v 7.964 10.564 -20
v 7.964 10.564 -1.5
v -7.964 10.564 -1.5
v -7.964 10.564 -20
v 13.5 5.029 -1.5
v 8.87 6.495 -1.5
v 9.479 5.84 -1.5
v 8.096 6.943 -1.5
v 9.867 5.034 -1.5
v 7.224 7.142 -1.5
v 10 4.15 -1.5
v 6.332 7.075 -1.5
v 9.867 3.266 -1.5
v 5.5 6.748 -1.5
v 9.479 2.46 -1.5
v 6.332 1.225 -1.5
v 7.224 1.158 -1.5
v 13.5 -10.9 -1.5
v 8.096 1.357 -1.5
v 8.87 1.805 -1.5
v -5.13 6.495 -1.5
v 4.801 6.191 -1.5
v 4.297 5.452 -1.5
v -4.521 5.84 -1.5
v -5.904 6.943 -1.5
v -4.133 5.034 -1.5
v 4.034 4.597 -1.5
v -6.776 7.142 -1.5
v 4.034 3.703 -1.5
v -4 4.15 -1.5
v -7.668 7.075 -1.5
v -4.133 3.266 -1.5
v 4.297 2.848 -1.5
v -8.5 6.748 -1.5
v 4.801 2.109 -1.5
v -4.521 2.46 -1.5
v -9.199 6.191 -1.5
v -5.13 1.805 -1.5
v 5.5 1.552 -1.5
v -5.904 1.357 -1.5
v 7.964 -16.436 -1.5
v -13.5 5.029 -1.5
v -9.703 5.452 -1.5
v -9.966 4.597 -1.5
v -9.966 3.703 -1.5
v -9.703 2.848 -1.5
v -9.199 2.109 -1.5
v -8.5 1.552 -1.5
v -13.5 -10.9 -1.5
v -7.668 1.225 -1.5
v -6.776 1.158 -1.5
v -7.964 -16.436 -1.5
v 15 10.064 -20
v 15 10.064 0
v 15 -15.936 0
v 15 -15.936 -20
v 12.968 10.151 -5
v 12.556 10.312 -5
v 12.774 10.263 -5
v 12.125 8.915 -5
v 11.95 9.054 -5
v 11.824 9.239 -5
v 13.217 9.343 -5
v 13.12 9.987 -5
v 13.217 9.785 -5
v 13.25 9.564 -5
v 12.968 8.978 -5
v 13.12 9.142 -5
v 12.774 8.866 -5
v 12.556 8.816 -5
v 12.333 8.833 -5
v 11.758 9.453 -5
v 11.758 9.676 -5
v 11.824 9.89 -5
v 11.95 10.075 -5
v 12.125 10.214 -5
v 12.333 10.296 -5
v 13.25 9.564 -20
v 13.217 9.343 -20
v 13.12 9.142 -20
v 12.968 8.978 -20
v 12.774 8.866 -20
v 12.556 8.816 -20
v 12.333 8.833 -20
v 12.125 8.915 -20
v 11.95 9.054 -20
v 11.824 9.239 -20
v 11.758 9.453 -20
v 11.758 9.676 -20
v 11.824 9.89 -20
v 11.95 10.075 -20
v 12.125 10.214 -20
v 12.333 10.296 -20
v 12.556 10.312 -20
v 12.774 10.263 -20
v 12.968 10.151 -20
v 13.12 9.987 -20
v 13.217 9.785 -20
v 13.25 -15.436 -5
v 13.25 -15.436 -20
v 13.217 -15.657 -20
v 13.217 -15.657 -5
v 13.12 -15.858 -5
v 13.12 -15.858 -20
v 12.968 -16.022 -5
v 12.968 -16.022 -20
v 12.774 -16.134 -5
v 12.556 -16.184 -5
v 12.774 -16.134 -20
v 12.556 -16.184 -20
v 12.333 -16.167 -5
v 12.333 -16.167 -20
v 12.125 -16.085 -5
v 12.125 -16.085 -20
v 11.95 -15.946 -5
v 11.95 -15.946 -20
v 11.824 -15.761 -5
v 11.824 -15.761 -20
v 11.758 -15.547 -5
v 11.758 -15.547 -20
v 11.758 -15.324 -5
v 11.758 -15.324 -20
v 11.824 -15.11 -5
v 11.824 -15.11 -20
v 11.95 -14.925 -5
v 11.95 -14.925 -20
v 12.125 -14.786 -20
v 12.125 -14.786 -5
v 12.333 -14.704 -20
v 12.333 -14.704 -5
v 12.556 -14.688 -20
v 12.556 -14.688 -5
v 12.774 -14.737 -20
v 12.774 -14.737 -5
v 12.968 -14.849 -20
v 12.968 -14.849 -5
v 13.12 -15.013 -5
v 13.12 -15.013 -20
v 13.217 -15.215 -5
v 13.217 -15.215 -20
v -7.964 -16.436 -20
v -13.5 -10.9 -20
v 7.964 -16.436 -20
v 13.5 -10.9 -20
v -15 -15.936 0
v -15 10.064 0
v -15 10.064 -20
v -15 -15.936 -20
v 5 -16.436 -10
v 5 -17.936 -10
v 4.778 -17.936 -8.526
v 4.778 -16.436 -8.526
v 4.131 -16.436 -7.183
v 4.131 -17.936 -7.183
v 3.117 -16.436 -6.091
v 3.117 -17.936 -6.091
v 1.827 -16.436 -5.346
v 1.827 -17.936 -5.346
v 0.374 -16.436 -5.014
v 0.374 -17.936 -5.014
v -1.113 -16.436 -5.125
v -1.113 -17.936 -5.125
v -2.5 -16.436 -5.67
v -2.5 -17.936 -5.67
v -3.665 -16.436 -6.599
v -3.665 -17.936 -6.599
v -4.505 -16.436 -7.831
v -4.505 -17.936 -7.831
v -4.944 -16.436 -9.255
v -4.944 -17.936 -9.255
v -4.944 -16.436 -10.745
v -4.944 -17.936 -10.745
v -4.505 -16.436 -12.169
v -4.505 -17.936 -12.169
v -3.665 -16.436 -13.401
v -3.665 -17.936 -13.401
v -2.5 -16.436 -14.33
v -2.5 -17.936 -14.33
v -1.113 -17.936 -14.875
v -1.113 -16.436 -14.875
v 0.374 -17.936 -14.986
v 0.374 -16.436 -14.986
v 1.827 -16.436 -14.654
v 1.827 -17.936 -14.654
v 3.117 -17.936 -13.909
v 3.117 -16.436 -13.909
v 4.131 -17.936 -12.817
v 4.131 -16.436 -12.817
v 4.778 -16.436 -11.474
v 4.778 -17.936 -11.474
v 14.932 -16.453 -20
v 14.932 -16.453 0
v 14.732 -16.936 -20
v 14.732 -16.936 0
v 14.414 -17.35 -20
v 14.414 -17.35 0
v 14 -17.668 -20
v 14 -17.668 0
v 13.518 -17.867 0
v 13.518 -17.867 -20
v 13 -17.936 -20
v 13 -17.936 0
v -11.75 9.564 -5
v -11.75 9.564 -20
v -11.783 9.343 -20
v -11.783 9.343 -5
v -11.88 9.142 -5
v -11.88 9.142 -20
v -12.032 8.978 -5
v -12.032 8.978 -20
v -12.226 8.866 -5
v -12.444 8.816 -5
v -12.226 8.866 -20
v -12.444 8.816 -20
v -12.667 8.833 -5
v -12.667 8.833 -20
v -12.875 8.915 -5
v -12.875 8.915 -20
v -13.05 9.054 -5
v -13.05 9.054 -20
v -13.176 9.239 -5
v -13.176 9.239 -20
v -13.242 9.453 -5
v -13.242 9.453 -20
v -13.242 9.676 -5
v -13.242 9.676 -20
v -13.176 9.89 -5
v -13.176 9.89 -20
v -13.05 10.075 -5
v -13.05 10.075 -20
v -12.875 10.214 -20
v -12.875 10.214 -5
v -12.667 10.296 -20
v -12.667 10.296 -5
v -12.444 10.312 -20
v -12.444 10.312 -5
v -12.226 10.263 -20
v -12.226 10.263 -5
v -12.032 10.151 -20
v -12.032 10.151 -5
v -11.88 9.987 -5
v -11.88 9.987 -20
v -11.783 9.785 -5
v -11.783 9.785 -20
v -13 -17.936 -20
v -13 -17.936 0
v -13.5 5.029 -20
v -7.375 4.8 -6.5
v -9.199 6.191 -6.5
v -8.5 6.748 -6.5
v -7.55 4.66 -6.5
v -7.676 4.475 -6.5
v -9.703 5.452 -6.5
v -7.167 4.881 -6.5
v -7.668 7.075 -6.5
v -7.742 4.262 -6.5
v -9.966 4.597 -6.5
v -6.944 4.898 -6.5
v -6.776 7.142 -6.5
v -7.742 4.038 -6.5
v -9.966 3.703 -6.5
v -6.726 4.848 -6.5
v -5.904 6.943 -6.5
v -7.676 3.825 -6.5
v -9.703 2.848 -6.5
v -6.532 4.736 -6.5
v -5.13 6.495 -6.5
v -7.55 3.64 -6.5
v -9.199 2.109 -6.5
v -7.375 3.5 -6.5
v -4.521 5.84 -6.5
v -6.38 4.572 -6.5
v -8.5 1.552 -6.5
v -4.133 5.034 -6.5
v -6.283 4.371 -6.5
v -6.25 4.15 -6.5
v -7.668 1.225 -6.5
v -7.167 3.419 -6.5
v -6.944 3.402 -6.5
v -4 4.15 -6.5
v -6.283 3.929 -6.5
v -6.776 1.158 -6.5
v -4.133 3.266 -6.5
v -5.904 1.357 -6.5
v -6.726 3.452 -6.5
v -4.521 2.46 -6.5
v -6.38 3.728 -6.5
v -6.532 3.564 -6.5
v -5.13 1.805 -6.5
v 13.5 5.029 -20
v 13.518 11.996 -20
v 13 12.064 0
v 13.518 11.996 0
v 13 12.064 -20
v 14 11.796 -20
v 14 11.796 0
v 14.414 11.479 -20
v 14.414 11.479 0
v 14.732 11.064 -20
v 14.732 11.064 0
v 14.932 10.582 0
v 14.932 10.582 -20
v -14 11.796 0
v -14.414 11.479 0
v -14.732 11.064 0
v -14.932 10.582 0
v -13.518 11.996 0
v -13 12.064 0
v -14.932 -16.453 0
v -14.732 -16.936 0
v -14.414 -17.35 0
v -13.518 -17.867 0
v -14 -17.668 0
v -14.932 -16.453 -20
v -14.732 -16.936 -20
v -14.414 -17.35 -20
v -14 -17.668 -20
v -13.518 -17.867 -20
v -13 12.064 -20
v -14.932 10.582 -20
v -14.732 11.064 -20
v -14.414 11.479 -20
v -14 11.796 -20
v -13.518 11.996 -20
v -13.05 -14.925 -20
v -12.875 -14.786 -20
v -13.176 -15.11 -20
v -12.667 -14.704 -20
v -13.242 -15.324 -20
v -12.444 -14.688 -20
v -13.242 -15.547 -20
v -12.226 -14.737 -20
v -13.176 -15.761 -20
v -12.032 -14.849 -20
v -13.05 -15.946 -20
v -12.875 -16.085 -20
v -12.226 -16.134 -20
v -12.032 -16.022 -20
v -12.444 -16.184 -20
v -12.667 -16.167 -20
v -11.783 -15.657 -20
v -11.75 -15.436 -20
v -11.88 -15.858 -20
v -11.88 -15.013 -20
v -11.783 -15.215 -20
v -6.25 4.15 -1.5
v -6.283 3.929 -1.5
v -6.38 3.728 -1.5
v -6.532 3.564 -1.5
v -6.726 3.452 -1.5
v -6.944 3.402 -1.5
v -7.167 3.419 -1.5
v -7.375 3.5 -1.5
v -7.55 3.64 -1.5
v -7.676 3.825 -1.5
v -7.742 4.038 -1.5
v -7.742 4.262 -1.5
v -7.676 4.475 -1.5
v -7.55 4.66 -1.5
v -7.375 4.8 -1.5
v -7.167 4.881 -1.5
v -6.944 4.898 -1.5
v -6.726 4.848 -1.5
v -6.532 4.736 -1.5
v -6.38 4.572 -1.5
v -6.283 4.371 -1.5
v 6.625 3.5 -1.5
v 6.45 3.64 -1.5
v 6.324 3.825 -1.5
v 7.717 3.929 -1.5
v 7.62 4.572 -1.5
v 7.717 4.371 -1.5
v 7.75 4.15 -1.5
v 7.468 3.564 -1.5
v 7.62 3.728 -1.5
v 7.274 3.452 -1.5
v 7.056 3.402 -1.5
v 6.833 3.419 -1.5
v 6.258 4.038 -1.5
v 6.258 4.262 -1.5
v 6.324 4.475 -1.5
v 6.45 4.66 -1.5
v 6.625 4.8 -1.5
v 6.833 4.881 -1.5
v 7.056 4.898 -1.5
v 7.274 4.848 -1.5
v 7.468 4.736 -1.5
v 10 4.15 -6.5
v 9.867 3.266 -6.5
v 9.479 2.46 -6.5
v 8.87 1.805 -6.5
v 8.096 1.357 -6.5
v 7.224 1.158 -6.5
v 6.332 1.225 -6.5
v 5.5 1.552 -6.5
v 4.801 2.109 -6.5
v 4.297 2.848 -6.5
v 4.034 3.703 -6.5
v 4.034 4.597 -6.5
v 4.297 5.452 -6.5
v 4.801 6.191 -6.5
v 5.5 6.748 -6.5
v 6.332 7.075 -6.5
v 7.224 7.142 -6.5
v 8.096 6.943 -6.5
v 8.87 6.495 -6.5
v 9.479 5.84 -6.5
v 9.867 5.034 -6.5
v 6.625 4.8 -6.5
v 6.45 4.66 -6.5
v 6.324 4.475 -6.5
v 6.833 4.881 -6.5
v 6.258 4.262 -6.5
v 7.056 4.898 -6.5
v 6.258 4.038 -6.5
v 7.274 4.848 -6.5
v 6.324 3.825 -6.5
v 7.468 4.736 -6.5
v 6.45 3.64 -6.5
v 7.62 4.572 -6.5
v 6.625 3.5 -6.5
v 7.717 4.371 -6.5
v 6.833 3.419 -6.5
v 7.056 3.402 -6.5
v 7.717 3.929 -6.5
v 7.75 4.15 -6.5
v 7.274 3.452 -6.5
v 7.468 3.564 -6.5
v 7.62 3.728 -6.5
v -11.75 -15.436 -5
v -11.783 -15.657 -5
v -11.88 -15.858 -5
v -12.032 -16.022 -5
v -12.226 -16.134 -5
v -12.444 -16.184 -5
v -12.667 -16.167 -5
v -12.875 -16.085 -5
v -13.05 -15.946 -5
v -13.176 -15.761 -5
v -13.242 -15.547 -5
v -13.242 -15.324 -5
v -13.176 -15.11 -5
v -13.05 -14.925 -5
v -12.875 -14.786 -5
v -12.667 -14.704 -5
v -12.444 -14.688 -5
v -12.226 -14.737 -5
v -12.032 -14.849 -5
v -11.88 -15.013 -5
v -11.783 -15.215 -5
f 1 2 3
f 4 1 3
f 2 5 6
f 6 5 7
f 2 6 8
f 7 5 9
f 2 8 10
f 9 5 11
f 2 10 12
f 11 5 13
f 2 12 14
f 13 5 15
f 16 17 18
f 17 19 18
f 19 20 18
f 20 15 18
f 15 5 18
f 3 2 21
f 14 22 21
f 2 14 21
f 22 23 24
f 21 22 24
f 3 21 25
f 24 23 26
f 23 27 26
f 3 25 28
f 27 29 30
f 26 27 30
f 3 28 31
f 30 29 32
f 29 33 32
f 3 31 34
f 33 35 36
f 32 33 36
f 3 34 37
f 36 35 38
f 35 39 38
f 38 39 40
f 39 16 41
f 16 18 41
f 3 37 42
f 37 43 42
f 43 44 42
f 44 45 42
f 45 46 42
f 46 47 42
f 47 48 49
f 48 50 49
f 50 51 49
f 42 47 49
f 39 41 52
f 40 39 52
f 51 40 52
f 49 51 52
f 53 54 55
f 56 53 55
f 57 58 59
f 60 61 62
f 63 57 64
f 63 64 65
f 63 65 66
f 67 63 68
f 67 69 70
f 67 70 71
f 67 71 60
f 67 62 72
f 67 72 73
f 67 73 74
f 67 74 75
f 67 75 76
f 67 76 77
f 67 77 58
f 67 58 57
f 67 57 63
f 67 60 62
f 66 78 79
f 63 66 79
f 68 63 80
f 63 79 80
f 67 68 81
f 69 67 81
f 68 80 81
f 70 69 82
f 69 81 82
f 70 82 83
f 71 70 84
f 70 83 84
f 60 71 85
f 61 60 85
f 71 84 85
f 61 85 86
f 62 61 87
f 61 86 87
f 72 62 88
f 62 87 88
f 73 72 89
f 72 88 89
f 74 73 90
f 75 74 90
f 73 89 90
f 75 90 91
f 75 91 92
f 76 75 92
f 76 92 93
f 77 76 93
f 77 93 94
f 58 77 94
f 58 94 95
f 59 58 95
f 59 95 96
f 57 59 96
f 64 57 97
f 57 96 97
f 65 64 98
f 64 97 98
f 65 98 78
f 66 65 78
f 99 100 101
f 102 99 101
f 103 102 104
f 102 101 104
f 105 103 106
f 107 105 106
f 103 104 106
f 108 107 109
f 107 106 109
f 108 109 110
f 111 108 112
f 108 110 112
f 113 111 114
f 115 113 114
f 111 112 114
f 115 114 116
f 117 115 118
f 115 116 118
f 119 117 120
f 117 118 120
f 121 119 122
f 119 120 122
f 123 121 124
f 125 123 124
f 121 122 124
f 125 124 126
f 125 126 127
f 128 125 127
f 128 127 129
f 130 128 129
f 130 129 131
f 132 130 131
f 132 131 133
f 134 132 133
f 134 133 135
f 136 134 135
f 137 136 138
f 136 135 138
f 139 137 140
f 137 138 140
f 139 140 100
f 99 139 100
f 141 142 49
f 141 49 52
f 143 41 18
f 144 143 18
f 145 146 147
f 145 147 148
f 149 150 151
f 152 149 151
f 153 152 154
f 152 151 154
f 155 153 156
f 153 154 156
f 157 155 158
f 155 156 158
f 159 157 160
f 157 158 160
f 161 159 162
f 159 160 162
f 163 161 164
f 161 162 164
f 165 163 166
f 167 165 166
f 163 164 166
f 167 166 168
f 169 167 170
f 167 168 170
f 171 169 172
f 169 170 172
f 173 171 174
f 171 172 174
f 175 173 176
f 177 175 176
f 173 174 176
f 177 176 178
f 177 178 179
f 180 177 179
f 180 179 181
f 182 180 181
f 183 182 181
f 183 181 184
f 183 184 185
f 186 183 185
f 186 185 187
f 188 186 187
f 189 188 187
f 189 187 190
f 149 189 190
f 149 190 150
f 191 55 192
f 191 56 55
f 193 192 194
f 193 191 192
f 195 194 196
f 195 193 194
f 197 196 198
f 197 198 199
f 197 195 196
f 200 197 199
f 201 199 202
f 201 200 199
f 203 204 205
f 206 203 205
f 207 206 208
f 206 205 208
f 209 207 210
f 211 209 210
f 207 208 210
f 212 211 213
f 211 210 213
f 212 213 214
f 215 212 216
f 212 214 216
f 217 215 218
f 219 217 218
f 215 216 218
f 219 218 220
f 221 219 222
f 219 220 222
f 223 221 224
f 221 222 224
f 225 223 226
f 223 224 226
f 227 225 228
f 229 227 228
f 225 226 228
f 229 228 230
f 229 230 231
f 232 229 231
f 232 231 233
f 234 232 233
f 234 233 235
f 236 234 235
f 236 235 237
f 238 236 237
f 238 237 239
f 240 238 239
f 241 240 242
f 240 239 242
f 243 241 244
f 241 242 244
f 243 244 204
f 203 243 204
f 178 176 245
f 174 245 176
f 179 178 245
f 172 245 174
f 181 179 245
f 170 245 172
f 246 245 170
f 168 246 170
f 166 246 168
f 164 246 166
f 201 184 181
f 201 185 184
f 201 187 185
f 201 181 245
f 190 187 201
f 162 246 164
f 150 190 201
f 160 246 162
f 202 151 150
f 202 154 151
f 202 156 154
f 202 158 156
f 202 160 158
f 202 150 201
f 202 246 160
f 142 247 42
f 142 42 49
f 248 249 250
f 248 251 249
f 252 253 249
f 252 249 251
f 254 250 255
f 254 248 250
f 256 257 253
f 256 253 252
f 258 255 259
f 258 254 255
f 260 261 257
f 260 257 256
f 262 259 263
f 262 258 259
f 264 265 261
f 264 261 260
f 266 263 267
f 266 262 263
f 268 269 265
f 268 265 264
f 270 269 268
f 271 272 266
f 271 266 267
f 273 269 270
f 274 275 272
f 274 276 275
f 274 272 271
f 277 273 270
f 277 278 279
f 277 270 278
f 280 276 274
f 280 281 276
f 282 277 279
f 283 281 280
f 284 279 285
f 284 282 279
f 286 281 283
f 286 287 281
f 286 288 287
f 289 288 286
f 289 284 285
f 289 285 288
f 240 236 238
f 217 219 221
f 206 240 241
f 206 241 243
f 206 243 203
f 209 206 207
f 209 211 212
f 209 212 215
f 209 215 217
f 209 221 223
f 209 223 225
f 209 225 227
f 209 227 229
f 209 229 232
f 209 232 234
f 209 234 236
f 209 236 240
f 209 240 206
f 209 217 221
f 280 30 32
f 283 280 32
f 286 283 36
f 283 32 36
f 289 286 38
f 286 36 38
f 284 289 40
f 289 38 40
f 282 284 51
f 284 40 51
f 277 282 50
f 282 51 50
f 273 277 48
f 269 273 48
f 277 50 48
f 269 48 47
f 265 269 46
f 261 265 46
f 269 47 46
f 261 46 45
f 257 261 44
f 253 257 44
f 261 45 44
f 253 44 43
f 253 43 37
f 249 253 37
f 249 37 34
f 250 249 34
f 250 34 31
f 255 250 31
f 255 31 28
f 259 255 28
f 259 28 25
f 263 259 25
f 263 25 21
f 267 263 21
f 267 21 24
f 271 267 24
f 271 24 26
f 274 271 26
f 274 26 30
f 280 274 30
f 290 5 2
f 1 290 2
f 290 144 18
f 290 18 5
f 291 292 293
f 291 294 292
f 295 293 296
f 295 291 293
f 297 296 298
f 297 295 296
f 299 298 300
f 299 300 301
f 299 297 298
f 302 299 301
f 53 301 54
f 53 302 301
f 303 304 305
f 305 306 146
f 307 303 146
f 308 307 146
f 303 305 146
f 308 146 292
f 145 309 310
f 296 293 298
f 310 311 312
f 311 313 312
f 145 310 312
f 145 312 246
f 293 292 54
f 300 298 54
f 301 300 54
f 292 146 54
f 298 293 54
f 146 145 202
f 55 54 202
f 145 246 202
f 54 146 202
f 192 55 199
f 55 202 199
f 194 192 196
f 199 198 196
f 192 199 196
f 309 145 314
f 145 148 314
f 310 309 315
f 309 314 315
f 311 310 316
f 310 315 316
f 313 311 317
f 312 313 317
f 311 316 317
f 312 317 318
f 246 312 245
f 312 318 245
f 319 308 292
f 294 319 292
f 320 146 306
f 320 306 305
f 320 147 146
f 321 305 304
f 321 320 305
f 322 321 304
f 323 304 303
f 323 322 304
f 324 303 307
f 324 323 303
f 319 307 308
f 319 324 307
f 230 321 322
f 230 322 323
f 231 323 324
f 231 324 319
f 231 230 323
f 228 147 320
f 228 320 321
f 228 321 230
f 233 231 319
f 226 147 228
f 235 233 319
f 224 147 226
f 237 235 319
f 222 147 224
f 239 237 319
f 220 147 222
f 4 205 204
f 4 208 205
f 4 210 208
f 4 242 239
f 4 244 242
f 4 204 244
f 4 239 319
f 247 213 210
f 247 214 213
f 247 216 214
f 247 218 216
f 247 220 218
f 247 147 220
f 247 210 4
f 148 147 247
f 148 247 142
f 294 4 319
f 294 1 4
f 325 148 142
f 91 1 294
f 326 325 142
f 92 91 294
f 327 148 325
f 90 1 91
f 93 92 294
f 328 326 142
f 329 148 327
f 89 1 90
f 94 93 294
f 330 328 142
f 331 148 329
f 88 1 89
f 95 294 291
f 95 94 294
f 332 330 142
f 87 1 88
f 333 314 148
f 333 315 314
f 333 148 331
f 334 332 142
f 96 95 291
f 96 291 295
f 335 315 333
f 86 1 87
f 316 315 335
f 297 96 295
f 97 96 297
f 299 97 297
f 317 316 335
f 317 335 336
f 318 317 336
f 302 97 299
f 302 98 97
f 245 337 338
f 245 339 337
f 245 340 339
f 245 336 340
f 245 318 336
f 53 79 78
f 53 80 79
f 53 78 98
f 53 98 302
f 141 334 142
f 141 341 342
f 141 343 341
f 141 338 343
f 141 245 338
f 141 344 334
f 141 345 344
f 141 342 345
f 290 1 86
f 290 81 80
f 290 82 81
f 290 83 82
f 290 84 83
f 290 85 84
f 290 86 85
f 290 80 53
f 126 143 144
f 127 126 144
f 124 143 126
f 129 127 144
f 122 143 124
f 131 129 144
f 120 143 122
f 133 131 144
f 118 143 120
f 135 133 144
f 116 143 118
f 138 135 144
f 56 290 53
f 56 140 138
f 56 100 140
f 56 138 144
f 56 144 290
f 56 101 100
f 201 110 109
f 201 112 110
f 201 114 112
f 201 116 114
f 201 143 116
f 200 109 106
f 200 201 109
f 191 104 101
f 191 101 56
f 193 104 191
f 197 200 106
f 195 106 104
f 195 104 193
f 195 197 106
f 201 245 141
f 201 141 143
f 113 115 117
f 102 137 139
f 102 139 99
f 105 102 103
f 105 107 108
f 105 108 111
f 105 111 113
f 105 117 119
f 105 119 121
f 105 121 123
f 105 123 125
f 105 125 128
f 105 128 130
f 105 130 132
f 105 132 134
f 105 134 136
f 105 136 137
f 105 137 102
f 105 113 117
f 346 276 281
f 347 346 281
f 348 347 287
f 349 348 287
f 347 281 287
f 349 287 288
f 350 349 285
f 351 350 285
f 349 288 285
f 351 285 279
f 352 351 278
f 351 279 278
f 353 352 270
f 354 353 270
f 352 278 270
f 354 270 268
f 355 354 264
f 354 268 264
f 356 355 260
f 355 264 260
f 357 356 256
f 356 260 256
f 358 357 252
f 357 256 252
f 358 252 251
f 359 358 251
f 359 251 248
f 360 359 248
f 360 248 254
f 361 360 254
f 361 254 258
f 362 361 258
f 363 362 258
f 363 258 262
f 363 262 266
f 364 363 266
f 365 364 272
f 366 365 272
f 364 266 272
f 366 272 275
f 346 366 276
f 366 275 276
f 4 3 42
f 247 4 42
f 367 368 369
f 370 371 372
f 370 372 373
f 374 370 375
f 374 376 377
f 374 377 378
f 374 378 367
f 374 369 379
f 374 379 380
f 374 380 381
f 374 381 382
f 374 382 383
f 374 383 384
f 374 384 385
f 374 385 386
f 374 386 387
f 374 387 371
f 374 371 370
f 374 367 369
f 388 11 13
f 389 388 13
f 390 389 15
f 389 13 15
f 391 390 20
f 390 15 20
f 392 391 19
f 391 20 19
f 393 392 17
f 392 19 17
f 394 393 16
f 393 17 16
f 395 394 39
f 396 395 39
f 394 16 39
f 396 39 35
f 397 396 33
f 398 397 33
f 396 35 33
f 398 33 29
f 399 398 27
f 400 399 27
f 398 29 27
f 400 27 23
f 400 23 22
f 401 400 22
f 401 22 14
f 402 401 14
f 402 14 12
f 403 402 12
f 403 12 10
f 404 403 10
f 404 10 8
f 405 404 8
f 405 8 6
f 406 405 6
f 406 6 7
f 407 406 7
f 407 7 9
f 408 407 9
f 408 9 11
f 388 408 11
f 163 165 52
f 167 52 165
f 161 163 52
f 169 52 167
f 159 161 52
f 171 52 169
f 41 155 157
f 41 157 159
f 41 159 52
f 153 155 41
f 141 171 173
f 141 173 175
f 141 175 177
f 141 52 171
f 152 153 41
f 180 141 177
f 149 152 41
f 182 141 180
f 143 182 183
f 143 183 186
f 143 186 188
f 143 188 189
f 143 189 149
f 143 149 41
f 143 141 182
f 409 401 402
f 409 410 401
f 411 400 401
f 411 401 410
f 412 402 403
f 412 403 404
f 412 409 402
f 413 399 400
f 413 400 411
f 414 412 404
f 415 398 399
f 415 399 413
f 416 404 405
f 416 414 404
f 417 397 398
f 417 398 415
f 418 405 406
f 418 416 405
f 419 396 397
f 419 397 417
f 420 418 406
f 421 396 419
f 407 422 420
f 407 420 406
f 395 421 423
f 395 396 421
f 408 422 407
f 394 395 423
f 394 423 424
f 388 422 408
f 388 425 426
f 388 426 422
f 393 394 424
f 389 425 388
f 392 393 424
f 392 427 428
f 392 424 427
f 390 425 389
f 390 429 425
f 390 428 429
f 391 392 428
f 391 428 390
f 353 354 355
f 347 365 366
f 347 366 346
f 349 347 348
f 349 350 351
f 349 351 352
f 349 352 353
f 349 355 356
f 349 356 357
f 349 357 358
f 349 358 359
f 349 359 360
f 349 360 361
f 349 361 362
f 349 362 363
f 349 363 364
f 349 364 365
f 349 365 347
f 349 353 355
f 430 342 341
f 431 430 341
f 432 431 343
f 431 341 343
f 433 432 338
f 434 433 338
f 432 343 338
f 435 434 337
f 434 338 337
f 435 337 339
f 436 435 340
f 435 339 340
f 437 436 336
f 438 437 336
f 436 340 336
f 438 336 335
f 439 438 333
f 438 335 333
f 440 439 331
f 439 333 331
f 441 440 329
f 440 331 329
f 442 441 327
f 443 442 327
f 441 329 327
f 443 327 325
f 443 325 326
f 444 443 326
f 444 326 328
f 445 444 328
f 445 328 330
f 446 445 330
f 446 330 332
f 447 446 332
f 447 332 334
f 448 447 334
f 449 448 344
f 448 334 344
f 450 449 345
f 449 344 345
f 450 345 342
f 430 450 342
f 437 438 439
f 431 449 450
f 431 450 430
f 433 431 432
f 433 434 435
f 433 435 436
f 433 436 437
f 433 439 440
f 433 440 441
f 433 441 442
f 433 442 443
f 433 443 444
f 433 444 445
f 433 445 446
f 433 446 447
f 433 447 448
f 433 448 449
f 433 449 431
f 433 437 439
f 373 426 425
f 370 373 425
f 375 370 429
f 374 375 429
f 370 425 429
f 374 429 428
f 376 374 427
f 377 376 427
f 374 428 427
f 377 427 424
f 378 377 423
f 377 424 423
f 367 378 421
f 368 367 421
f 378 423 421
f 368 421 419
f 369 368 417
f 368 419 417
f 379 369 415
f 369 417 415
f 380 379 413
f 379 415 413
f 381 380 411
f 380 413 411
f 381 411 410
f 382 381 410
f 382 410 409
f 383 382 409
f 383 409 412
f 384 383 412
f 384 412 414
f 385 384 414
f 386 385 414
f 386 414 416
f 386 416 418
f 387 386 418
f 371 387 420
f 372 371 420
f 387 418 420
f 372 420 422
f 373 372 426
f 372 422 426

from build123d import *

# Parameters (mm, degrees)
SKETCH014_W     = 30
SKETCH014_H     = 30
PAD008_DEPTH    = 20
POCKET006_DEPTH = 18.5
SKETCH016_R     = 3
PAD009_DEPTH    = 6.5
SKETCH017_R     = 0.75
POCKET007_DEPTH = 5
SKETCH018_R     = 0.75
POCKET008_DEPTH = 15
SKETCH021_R     = 5
POCKET009_DEPTH = 5
FILLET001_R     = 2


with BuildPart() as part:
    # Sketch014 (on Face1 of ReferencePocket001) → Pad008 (new body)
    with BuildSketch(Plane(origin=(0, 0, 0), x_dir=(1, 0, 0), z_dir=(0, 0, -1))):
        with Locations((0, 2.9356231958)):
            Rectangle(SKETCH014_W, SKETCH014_H)
    extrude(amount=PAD008_DEPTH)

    # Sketch015 (on Face6 of Pad008) → Pocket006 (cut)
    with BuildSketch(Plane(origin=(0, 0, -20), x_dir=(1, 0, 0), z_dir=(0, 0, -1))):
        Polygon((-13.5, -5.0288428982), (-13.5, 10.9000892899), (-7.9644660941, 16.4356231958), (7.9644660941, 16.4356231958), (13.5, 10.9000892899), (13.5, -5.0288428982), (7.9644660941, -10.5643768042), (-7.9644660941, -10.5643768042), align=None)
    extrude(amount=-POCKET006_DEPTH, mode=Mode.SUBTRACT)

    # Sketch016 (on Face1 of ReferencePocket001) → Pad009 (join)
    with BuildSketch(Plane(origin=(0, 0, 0), x_dir=(1, 0, 0), z_dir=(0, 0, -1))):
        with Locations((-7, -4.15)):
            Circle(SKETCH016_R)
        with Locations((7, -4.15)):
            Circle(SKETCH016_R)
    extrude(amount=PAD009_DEPTH)

    # Sketch017 (on Face20 of Pad009) → Pocket007 (cut)
    with BuildSketch(Plane(origin=(0, 0, -6.5), x_dir=(1, 0, 0), z_dir=(0, 0, -1))):
        with Locations((-7, -4.15)):
            Circle(SKETCH017_R)
        with Locations((7, -4.15)):
            Circle(SKETCH017_R)
    extrude(amount=-POCKET007_DEPTH, mode=Mode.SUBTRACT)

    # Sketch018 (on Face5 of Pocket007) → Pocket008 (cut)
    with BuildSketch(Plane(origin=(0, 0, -20), x_dir=(1, 0, 0), z_dir=(0, 0, -1))):
        with Locations((-12.5, 15.4356231958)):
            Circle(SKETCH018_R)
        with Locations((12.5, 15.4356231958)):
            Circle(SKETCH018_R)
        with Locations((12.5, -9.5643768042)):
            Circle(SKETCH018_R)
        with Locations((-12.5, -9.5643768042)):
            Circle(SKETCH018_R)
    extrude(amount=-POCKET008_DEPTH, mode=Mode.SUBTRACT)

    # Sketch021 (on Face1 of Pocket008) → Pocket009 (cut)
    with BuildSketch(Plane.XZ.offset(17.9356231958)):
        with Locations((0, -10)):
            Circle(SKETCH021_R)
    extrude(amount=-POCKET009_DEPTH, mode=Mode.SUBTRACT)

    # Fillet001
    fillet001_edges = [part.edges().sort_by_distance(p)[0] for p in [
        (15, -17.935623, -10),
        (15, 12.064377, -10),
        (-15, -17.935623, -10),
        (-15, 12.064377, -10),
    ]]
    fillet(fillet001_edges, radius=FILLET001_R)


solid = part.part
